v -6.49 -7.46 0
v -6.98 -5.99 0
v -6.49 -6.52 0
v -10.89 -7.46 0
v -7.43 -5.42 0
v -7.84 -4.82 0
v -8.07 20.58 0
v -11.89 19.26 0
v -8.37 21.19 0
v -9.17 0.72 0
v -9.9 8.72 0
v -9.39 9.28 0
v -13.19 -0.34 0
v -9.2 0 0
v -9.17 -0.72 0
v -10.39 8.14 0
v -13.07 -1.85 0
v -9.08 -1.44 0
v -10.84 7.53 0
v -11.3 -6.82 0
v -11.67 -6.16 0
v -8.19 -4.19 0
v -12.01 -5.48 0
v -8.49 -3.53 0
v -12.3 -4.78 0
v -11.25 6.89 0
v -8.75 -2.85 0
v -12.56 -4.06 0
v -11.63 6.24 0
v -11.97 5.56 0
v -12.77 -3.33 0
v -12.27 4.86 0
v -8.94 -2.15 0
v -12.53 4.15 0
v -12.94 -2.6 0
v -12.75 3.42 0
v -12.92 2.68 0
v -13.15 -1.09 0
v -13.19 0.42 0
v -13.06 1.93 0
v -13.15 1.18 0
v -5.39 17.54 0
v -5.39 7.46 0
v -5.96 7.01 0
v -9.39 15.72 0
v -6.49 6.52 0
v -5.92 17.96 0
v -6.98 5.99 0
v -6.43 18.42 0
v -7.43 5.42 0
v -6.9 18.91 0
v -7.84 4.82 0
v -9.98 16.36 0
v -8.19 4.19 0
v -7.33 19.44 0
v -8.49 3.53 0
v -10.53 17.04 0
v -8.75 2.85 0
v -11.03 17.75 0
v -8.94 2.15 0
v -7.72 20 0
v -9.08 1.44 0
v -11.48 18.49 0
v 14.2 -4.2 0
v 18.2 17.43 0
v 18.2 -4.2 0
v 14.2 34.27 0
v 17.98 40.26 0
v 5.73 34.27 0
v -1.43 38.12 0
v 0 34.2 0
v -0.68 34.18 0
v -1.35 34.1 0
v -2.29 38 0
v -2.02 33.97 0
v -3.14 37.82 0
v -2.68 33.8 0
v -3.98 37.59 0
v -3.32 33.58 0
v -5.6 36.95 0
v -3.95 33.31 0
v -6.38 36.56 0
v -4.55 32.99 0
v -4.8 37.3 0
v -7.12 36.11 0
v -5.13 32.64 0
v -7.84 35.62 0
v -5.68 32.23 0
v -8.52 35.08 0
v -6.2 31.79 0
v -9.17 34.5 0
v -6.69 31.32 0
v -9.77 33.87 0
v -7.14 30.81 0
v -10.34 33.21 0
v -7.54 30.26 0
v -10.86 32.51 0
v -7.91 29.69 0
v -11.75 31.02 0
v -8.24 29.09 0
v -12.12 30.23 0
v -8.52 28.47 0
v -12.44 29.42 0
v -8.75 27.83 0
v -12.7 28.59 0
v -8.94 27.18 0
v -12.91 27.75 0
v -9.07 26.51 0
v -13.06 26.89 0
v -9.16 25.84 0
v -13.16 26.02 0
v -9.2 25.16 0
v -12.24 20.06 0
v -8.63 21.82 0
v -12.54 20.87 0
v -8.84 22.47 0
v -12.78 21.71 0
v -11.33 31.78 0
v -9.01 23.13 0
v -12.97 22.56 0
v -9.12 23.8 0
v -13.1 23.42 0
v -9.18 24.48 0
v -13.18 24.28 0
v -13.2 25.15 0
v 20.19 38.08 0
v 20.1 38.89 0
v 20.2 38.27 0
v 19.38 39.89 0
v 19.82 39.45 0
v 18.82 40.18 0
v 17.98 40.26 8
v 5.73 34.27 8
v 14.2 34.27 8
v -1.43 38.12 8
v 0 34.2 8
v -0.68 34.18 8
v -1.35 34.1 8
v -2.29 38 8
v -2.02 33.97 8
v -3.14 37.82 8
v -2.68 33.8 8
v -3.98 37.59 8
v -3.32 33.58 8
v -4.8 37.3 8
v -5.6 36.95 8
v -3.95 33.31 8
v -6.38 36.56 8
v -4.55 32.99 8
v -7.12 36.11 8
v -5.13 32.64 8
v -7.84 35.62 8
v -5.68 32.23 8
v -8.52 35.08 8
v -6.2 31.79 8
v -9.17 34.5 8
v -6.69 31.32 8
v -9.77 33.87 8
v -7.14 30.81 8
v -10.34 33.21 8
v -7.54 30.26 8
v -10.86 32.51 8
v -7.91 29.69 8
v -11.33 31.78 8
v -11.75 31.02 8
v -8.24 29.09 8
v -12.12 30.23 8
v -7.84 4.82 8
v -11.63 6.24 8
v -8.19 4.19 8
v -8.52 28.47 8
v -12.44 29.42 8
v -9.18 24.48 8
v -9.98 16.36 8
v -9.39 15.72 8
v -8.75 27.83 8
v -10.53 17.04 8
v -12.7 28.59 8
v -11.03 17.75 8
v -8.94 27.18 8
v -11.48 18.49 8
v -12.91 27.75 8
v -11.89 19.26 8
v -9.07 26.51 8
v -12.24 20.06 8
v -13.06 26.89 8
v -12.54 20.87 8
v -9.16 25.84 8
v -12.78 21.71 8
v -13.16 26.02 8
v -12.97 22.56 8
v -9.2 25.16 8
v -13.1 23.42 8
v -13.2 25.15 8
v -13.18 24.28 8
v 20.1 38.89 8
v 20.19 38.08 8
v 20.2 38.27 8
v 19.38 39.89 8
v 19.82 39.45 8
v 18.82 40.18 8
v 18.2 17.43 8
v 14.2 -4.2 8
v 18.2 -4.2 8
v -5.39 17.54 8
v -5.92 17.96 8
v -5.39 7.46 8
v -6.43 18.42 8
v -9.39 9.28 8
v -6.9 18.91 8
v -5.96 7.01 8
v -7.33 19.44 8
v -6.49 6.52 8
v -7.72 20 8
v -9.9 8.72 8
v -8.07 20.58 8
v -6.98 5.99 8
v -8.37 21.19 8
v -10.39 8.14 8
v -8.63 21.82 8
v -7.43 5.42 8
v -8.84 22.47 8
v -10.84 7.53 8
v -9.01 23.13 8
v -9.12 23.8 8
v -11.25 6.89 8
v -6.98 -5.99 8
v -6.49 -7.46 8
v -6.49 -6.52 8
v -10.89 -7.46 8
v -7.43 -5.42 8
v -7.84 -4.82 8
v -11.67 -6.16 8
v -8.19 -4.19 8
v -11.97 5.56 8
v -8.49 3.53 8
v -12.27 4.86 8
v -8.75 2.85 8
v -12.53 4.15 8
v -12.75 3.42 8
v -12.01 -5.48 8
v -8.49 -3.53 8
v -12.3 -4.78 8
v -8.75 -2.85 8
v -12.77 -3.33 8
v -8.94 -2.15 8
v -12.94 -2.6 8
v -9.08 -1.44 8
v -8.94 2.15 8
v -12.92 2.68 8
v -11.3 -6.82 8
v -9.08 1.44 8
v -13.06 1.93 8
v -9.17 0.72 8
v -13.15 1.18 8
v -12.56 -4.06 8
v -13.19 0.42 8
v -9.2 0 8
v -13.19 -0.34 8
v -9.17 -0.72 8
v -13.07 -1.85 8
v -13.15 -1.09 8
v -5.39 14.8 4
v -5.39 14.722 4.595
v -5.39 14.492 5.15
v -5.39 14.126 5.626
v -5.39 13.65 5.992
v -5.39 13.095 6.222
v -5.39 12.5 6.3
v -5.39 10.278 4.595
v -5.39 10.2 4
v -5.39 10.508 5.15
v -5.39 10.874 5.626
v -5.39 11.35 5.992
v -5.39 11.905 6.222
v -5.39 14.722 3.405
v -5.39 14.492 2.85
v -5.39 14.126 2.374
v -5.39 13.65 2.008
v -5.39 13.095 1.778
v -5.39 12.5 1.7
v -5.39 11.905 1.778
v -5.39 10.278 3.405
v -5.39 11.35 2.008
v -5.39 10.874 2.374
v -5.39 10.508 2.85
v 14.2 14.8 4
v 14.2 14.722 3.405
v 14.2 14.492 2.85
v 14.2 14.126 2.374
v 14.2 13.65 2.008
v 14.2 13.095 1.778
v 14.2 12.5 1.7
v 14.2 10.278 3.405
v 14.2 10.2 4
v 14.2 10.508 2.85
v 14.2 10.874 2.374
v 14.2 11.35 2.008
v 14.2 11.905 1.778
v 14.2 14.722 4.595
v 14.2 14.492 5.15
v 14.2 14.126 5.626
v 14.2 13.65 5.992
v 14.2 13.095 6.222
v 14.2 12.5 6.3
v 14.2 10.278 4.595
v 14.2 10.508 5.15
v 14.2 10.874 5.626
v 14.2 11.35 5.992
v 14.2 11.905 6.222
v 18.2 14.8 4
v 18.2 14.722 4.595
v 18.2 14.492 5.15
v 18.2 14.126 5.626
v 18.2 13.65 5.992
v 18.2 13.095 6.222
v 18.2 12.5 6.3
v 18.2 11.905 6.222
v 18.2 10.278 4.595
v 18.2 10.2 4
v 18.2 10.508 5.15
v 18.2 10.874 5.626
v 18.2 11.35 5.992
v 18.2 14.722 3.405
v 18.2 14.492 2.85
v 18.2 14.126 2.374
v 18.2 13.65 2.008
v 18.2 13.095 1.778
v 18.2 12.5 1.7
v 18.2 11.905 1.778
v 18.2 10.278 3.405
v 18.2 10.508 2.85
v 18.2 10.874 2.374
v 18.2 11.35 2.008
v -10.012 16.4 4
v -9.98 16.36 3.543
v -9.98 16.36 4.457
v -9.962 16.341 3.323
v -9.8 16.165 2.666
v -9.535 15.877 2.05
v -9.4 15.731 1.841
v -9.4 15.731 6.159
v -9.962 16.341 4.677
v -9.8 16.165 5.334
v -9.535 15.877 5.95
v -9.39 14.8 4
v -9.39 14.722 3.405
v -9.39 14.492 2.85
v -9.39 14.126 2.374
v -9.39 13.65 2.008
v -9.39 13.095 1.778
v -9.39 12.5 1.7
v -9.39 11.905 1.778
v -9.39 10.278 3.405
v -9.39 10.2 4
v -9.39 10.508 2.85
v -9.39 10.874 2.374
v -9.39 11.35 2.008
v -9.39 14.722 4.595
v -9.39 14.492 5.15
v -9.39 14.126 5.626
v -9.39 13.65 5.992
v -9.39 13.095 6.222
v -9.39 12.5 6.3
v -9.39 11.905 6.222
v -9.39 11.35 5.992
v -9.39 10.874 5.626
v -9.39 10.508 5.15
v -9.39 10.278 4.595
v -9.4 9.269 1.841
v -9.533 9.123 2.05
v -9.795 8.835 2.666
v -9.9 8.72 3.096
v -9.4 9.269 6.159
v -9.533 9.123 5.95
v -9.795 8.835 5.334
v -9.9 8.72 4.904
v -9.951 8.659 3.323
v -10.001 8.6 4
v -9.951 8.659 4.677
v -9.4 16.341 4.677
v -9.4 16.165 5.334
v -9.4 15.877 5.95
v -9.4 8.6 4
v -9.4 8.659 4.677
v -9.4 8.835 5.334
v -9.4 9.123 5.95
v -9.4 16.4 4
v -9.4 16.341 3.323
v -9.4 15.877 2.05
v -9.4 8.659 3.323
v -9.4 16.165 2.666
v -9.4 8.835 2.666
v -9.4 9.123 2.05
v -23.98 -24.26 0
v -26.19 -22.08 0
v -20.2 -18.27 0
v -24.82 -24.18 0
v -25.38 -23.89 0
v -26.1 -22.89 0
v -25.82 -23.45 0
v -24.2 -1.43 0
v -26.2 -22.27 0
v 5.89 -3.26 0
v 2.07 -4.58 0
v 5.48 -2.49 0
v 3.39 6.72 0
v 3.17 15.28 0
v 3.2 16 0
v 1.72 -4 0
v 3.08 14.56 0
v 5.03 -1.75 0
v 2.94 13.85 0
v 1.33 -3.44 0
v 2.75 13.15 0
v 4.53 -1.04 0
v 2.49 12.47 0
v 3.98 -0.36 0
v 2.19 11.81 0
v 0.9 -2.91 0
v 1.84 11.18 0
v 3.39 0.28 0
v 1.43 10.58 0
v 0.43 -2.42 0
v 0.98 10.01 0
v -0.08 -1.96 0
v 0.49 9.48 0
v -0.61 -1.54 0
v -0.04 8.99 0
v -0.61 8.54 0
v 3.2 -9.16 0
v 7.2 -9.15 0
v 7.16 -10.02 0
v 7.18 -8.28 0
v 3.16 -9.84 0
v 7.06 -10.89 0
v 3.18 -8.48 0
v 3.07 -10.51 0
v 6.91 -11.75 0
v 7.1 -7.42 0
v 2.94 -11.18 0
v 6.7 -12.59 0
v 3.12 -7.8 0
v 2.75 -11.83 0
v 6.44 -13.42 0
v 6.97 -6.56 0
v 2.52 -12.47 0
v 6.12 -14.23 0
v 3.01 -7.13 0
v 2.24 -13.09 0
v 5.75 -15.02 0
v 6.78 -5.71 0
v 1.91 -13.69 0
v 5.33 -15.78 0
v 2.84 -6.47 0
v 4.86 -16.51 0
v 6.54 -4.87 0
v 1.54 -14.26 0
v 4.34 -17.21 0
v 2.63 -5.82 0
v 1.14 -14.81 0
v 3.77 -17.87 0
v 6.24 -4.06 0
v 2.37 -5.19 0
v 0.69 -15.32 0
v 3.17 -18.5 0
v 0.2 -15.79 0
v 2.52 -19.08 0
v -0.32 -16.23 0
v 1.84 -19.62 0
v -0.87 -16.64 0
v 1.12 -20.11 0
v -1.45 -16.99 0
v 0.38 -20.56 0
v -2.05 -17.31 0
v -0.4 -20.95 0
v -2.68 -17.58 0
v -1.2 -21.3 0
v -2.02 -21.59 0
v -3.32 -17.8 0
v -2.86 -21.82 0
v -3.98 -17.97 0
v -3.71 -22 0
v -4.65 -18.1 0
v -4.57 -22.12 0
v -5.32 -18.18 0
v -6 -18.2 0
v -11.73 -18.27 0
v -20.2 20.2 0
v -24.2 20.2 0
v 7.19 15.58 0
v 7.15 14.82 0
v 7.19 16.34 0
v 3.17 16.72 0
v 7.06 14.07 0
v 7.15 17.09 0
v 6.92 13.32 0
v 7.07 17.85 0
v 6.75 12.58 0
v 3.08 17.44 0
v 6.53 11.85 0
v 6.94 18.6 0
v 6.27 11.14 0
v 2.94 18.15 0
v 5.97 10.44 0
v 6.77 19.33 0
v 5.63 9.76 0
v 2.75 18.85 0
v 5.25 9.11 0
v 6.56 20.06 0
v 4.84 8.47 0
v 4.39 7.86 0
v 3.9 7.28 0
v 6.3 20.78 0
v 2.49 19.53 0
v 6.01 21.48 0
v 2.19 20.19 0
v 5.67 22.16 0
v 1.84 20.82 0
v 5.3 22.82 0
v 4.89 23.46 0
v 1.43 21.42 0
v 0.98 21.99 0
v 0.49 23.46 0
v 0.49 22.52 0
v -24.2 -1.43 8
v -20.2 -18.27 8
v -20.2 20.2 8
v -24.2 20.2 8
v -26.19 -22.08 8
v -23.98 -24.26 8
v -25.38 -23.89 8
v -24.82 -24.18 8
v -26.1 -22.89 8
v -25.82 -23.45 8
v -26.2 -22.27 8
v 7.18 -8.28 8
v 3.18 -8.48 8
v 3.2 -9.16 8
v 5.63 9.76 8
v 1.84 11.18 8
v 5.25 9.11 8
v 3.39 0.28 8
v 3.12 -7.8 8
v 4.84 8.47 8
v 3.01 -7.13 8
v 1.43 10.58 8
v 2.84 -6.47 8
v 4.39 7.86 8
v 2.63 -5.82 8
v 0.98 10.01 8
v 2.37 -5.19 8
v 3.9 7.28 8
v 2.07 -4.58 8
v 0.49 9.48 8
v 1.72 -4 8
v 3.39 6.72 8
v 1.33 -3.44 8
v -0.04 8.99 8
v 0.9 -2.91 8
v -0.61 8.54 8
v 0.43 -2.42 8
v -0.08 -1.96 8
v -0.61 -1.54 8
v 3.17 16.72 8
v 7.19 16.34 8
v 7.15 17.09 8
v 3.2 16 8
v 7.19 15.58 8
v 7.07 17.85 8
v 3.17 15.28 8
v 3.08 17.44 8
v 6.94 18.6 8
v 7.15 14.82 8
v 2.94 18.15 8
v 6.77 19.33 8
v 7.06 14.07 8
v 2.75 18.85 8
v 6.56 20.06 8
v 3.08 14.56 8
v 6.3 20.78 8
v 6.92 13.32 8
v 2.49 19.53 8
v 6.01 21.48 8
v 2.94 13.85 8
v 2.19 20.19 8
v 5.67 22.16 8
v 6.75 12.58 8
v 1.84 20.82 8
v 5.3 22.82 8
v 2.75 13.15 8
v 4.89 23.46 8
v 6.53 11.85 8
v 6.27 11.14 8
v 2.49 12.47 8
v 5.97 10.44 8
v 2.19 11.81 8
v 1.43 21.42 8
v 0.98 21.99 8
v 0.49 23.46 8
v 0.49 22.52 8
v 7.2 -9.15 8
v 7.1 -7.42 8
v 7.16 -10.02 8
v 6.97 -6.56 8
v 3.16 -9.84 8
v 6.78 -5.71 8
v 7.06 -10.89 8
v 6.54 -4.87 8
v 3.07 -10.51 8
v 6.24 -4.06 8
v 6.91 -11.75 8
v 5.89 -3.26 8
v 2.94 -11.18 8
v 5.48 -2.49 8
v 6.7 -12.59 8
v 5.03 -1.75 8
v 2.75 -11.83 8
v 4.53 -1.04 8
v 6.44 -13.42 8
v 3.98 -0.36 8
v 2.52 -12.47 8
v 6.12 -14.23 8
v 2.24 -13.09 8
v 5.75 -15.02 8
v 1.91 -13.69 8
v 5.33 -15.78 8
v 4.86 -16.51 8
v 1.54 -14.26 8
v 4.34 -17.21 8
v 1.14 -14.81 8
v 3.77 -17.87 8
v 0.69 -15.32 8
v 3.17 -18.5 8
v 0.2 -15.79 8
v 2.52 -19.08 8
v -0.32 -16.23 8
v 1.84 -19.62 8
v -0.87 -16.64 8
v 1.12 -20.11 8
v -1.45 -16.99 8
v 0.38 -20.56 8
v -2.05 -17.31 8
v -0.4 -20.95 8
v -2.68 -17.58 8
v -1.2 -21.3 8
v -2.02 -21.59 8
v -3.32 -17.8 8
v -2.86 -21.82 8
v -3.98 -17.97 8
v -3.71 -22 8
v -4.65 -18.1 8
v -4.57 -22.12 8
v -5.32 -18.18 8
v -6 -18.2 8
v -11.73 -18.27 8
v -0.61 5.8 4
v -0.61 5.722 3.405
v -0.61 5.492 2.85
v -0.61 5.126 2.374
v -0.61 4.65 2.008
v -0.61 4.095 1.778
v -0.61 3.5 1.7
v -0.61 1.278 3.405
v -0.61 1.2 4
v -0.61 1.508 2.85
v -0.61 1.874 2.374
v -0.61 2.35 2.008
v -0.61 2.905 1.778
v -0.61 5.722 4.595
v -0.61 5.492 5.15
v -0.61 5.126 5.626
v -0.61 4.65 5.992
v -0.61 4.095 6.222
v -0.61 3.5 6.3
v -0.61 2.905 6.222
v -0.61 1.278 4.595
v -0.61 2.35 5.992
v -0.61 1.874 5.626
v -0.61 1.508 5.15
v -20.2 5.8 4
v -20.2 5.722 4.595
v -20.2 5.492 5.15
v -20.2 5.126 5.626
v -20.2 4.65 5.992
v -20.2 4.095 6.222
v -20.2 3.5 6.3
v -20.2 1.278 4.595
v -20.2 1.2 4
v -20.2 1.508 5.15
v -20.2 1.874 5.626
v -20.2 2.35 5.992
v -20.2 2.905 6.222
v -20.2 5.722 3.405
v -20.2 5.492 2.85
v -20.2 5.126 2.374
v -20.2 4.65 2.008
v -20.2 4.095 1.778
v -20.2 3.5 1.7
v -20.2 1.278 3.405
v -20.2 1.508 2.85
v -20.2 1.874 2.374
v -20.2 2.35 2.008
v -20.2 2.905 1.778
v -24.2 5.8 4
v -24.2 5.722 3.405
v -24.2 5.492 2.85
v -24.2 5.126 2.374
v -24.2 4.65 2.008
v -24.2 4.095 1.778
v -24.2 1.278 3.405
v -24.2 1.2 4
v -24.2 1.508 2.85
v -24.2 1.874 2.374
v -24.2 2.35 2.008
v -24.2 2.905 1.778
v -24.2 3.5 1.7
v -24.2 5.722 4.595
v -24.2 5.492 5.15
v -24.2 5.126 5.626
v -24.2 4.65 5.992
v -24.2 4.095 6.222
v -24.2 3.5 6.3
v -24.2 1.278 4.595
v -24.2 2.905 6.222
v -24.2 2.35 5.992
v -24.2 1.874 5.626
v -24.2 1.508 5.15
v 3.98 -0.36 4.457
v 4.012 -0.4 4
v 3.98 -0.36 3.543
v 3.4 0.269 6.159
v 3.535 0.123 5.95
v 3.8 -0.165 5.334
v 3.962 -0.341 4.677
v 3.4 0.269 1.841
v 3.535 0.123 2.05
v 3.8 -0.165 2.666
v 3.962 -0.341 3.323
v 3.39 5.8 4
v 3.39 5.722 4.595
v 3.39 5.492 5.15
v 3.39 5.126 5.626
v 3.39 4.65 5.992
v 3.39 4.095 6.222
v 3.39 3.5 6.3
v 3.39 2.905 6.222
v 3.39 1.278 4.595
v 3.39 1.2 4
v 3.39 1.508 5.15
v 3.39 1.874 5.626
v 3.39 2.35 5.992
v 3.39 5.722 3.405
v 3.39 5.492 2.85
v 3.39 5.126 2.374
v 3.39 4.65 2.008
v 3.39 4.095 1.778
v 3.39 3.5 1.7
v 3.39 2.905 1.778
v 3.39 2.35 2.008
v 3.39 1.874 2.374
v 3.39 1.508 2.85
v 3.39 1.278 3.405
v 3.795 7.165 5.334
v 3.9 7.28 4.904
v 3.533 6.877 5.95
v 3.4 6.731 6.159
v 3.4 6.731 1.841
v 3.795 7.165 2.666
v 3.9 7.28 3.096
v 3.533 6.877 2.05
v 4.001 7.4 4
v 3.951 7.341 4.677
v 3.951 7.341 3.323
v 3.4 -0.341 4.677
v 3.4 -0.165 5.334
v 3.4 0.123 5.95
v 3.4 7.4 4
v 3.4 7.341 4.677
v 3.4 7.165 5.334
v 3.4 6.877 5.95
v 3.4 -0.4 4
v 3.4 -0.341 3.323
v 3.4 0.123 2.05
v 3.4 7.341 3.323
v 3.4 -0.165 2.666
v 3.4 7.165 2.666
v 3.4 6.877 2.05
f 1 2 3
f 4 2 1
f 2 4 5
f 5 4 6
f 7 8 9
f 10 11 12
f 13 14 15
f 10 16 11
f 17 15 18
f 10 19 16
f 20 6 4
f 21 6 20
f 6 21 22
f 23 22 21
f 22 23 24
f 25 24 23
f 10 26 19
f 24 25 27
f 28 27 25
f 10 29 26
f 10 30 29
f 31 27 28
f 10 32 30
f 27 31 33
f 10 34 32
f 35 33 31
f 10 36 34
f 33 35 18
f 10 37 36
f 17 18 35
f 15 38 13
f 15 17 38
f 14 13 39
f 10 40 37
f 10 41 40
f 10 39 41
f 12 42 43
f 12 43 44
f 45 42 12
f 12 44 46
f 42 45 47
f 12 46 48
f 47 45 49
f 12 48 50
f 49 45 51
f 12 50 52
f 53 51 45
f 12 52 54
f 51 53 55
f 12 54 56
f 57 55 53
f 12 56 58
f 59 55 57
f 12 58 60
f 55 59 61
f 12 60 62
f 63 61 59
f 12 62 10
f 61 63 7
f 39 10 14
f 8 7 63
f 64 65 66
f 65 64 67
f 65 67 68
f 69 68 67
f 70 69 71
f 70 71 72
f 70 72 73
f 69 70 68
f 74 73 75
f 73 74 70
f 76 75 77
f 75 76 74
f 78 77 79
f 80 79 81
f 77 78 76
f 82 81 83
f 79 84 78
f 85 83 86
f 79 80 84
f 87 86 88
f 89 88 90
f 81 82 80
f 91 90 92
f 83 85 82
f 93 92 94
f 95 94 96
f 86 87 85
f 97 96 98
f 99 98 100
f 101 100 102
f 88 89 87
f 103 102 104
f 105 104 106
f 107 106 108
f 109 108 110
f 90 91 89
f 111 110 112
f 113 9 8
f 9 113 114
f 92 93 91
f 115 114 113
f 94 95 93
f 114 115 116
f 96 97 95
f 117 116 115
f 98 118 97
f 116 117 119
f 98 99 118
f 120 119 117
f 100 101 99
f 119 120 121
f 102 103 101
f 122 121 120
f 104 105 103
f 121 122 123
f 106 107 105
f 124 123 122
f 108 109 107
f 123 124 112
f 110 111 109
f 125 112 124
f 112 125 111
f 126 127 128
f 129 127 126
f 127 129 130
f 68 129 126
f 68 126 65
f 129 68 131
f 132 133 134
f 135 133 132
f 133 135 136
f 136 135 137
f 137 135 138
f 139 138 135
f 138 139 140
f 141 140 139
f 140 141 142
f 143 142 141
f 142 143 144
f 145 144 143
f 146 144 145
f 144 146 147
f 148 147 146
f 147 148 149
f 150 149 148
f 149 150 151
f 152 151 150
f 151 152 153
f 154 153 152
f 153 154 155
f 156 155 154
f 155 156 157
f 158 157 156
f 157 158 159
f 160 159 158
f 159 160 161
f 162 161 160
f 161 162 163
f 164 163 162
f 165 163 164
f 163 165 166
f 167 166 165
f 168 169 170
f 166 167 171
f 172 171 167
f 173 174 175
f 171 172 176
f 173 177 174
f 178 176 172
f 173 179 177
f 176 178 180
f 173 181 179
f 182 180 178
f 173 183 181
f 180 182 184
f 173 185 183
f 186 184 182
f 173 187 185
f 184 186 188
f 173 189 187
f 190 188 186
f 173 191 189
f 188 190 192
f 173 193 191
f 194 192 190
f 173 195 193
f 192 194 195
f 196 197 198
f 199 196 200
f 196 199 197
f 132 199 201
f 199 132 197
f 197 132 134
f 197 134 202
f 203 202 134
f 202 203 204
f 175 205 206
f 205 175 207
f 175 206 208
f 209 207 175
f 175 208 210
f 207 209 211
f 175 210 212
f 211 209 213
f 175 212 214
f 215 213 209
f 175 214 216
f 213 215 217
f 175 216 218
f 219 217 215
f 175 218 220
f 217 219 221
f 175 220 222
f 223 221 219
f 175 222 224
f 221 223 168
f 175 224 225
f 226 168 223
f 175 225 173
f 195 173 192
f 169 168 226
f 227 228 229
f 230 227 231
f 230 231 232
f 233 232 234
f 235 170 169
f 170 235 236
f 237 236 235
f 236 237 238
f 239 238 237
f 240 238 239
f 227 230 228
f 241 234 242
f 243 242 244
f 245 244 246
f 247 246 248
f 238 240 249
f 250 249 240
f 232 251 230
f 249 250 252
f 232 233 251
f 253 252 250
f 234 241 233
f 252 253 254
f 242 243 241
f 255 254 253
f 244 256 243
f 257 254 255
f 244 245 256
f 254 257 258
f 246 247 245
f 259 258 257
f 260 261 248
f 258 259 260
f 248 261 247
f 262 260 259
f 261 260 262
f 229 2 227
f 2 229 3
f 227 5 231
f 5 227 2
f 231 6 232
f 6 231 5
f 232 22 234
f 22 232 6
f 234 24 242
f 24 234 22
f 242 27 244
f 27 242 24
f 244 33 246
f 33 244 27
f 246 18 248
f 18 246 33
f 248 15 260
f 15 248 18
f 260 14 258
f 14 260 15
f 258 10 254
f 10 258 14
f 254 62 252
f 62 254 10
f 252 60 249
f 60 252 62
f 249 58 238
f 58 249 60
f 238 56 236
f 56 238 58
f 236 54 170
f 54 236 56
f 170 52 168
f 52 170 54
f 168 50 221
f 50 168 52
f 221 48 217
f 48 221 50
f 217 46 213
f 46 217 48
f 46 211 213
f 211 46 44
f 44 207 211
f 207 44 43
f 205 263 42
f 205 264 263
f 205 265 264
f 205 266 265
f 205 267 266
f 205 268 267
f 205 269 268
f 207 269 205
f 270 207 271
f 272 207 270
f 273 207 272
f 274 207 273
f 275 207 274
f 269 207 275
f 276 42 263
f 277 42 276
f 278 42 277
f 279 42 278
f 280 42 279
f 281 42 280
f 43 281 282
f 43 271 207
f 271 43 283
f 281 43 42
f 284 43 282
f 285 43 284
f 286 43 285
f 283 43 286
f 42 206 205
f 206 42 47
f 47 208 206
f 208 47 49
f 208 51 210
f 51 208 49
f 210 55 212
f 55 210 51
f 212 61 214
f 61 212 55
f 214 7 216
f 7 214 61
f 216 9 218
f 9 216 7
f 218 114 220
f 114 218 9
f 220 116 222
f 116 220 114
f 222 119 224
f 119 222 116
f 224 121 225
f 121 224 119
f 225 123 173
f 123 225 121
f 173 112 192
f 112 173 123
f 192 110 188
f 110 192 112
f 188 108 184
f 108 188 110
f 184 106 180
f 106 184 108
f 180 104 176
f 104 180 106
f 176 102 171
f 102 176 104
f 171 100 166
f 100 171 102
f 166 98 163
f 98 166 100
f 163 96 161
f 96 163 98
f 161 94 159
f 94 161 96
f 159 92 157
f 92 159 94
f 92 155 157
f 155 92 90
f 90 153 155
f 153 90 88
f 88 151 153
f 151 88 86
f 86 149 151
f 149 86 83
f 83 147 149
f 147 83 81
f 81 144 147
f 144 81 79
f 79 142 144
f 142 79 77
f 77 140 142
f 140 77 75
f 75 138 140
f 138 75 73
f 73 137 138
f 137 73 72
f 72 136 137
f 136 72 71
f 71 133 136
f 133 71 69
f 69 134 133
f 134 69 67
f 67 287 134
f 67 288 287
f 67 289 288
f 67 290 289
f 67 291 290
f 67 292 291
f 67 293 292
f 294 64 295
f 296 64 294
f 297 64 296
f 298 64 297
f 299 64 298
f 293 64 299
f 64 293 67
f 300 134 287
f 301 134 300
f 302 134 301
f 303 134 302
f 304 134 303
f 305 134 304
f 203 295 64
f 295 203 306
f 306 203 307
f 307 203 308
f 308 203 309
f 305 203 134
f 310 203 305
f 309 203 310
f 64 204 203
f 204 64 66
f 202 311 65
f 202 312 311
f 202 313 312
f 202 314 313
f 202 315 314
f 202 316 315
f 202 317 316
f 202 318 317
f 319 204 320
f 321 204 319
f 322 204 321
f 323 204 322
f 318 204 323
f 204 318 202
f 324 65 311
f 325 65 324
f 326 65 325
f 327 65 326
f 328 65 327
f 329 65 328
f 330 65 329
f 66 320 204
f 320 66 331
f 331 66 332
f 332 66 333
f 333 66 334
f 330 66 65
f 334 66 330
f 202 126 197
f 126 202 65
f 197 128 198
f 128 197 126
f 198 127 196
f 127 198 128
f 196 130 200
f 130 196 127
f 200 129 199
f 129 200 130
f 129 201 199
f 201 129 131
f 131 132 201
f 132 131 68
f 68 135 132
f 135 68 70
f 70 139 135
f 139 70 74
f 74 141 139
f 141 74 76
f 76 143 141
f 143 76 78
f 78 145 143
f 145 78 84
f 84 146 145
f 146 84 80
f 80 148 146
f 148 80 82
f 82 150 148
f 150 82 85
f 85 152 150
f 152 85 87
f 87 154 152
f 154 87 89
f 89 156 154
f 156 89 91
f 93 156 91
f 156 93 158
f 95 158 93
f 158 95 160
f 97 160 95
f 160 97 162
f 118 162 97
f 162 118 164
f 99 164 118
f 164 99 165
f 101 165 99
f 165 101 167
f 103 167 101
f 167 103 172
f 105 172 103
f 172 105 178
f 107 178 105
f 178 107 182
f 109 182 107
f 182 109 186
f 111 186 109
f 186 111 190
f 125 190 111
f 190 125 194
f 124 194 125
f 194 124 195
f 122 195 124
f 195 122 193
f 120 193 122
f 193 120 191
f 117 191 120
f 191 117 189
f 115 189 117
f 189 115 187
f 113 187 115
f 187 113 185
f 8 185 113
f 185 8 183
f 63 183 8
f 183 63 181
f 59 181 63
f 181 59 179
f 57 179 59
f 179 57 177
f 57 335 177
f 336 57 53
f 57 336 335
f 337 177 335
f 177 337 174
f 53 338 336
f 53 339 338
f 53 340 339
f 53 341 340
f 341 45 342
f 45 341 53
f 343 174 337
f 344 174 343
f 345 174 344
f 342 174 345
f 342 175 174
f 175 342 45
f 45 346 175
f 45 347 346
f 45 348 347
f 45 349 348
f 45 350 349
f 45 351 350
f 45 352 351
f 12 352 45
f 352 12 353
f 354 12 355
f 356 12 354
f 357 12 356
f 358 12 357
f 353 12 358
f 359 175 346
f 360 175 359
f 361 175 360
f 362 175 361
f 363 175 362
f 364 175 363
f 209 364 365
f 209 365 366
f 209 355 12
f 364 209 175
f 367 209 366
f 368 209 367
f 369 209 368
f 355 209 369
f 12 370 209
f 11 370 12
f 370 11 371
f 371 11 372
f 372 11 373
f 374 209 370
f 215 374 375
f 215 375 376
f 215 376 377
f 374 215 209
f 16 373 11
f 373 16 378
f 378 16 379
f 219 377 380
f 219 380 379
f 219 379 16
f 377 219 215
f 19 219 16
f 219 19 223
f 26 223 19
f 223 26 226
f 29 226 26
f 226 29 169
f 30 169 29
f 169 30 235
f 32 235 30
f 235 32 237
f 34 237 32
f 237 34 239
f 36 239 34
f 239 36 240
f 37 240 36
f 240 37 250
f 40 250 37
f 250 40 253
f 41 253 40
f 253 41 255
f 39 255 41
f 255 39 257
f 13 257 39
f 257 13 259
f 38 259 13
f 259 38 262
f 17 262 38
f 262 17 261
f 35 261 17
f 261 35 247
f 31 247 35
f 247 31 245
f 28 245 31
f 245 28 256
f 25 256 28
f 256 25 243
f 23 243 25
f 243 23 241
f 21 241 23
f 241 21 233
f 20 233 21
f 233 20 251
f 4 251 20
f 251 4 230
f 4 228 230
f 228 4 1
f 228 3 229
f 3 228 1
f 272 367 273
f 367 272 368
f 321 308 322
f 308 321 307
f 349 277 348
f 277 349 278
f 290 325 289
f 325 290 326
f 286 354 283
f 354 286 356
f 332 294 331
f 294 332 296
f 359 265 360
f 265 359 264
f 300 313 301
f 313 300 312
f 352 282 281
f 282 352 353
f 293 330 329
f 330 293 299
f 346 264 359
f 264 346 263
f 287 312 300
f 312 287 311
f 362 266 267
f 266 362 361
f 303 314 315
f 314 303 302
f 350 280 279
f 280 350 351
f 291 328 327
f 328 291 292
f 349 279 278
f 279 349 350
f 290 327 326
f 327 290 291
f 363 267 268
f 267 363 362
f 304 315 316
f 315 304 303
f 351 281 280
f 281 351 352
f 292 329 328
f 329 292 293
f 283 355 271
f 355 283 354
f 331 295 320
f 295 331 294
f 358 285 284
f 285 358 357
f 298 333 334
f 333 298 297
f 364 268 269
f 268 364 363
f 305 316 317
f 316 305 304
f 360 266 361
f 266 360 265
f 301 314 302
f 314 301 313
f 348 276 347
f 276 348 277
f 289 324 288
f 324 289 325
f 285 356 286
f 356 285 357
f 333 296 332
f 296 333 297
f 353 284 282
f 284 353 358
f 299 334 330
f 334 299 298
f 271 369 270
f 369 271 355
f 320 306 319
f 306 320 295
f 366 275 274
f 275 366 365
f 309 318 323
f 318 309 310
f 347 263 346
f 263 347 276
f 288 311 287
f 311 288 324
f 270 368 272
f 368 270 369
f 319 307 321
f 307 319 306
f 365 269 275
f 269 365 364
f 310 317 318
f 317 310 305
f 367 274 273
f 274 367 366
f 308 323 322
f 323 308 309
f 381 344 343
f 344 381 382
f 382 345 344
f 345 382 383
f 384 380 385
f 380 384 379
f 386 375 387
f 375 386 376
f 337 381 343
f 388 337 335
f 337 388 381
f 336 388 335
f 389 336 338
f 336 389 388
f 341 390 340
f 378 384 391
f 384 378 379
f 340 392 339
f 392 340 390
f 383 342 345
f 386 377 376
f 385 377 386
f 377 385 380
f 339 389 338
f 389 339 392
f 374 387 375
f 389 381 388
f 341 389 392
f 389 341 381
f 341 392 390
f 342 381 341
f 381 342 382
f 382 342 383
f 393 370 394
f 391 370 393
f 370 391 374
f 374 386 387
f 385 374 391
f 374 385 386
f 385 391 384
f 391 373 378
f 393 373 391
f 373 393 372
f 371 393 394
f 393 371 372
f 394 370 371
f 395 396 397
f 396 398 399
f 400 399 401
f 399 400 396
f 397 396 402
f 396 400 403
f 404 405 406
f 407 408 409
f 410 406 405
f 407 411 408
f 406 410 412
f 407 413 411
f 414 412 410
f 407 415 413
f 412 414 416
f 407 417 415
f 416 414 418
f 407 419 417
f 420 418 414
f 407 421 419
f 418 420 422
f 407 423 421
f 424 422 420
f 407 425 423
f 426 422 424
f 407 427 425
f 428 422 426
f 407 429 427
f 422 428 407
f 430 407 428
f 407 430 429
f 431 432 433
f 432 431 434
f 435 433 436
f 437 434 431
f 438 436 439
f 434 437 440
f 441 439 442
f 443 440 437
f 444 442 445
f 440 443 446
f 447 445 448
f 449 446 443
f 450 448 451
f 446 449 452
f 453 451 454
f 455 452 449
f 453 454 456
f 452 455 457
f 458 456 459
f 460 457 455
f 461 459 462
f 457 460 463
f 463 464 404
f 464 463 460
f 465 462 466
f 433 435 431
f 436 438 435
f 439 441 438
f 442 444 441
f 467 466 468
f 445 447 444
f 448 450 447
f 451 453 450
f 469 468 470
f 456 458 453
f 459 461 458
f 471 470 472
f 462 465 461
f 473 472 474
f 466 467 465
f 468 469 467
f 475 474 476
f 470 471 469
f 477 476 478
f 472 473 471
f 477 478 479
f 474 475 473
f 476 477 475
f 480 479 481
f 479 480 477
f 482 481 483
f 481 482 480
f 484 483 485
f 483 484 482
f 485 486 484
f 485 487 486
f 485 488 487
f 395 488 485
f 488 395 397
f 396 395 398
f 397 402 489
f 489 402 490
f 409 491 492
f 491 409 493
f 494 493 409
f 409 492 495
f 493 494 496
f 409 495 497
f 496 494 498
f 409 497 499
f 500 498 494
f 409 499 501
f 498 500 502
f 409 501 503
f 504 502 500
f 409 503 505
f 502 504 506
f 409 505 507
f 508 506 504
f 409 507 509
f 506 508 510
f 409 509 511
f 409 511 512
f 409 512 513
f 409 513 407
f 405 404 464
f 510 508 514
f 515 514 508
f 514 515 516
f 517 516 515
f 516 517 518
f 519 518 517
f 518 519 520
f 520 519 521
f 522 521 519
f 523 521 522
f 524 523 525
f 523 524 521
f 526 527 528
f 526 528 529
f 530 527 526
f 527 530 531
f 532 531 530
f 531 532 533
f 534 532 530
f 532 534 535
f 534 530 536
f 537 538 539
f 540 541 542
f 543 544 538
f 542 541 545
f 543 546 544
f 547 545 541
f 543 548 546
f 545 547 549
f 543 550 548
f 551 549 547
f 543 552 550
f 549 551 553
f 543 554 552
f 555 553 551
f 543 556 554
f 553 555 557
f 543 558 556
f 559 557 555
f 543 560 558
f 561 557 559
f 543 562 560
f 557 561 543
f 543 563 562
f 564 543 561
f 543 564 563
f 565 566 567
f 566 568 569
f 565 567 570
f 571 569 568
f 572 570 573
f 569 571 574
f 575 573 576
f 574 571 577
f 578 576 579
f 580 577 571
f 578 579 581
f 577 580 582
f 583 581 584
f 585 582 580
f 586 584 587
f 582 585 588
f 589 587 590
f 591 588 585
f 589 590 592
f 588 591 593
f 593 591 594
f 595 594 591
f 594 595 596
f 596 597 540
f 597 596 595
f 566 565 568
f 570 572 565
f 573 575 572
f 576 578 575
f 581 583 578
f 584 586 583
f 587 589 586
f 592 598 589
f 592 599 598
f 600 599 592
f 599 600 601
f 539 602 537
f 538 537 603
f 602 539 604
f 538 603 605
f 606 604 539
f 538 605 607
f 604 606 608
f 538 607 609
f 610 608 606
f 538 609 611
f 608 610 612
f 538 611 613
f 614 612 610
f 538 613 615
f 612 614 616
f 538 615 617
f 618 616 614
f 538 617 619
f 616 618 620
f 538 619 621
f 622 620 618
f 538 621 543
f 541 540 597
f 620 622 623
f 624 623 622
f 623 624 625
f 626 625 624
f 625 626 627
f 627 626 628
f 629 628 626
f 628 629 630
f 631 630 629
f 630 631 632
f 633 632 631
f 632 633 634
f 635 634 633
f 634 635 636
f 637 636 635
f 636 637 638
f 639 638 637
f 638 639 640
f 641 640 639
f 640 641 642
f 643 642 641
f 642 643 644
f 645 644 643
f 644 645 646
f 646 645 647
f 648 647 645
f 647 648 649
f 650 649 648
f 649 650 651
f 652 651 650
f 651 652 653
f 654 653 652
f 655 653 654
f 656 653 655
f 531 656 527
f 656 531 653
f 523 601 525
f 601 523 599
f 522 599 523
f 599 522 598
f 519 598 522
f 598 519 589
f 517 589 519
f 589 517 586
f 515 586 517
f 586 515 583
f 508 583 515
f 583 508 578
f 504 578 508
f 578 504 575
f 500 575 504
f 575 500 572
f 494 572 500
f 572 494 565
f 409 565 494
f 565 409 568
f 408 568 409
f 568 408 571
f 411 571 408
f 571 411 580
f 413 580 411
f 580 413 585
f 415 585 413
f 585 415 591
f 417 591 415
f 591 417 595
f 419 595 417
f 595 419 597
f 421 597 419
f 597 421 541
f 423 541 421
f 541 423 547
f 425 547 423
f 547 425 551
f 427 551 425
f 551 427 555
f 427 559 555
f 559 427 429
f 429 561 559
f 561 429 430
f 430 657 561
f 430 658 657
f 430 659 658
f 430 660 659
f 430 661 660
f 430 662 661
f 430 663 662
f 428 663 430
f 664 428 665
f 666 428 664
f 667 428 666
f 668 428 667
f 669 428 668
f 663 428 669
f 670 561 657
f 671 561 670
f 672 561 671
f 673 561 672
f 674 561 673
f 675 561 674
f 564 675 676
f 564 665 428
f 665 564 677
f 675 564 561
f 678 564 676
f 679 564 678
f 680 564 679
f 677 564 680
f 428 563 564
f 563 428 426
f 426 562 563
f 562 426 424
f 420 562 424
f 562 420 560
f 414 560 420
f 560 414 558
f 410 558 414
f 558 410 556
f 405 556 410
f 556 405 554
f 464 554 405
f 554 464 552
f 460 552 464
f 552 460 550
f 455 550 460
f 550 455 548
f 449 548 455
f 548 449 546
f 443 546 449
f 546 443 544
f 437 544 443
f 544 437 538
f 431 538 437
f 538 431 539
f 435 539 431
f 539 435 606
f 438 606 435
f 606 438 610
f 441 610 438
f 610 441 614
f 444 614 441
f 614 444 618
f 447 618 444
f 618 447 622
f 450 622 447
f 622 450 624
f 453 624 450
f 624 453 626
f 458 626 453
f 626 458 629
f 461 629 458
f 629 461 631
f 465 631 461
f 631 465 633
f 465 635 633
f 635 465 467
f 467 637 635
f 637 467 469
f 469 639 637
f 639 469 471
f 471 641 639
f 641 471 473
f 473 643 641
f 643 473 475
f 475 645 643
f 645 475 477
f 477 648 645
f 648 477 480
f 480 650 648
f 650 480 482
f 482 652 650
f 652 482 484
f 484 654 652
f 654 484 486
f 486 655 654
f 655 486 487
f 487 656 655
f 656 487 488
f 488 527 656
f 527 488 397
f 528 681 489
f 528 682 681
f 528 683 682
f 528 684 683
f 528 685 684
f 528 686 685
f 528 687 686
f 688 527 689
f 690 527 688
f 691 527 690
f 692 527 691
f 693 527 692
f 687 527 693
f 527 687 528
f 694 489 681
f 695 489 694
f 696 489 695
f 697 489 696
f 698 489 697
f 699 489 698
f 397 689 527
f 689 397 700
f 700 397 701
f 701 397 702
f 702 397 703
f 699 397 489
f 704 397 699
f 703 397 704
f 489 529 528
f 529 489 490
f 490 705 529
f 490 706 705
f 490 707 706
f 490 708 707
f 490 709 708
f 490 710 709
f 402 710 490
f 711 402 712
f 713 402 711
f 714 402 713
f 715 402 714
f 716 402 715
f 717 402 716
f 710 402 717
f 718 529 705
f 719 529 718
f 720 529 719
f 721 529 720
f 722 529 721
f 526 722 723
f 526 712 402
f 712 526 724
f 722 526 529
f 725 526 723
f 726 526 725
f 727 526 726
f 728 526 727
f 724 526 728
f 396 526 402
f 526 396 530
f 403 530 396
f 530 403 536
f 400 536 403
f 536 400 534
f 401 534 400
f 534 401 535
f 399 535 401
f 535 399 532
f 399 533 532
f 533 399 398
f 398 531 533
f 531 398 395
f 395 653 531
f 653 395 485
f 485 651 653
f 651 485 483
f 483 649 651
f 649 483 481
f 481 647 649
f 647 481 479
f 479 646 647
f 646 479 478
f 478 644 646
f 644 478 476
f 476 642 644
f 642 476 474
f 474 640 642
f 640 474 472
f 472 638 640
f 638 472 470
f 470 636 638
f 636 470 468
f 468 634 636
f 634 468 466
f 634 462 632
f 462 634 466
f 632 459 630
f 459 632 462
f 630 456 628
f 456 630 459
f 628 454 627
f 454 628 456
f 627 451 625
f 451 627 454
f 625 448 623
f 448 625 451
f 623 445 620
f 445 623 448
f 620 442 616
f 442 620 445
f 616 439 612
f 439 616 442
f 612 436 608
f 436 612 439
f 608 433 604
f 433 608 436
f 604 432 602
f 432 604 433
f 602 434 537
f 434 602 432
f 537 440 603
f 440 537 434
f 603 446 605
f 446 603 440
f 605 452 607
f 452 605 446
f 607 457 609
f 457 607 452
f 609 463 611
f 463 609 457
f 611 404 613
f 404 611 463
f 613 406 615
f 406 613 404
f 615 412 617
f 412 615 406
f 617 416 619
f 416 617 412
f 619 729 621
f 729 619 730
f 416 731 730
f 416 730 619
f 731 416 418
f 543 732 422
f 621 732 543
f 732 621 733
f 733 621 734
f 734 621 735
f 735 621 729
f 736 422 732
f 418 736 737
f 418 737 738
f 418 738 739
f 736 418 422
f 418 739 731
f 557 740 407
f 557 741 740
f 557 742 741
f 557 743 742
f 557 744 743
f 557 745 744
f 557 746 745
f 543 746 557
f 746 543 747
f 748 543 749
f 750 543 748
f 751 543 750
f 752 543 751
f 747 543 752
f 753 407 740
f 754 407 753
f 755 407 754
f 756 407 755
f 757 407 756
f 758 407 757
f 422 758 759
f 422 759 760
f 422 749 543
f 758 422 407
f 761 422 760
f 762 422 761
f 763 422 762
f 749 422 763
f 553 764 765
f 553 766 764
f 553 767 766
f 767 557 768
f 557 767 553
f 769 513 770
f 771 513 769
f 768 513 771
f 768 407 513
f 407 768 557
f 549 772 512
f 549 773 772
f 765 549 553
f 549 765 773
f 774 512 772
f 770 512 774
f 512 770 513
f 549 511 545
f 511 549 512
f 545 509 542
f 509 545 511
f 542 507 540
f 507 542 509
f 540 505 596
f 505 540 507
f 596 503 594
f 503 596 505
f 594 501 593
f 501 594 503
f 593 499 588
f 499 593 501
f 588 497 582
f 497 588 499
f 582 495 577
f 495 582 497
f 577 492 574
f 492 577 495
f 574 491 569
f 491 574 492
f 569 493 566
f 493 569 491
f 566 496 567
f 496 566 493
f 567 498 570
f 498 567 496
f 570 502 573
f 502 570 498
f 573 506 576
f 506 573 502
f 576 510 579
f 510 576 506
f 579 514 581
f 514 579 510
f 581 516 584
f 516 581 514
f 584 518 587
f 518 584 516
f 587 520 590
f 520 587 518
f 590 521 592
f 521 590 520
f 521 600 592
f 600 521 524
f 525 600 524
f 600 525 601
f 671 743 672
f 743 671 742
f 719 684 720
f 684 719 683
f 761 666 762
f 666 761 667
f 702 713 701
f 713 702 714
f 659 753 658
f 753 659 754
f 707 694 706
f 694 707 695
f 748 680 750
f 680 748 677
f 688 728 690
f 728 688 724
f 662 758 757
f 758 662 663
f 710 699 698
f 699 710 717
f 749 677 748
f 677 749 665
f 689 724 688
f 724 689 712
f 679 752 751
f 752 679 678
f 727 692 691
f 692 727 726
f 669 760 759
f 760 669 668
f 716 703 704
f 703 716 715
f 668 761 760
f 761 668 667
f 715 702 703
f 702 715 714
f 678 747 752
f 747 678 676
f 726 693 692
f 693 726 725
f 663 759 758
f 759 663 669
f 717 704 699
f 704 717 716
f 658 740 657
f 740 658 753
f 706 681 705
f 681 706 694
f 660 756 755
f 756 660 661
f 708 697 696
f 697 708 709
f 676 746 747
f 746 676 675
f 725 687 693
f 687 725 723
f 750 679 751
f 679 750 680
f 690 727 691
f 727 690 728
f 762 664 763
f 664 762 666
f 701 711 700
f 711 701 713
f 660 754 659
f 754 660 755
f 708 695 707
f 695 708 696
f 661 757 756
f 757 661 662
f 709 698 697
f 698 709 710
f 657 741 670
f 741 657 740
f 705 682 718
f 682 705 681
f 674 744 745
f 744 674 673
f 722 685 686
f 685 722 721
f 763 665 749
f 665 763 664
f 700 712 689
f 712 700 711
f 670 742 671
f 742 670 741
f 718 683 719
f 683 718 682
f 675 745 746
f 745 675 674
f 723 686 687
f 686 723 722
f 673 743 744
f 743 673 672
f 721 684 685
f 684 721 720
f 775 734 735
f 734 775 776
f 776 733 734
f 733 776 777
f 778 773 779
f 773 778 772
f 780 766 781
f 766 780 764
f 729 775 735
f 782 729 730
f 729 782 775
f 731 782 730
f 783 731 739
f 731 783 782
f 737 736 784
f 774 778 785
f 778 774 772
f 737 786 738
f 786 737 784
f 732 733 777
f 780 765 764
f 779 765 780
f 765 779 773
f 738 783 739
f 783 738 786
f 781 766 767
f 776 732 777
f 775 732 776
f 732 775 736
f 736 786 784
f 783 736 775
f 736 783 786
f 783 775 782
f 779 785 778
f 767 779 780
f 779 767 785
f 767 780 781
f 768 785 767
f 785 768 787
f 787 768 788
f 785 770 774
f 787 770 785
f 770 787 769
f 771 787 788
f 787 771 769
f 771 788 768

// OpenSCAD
//Brackets to hold Horizontal 1/2" EMT to Vertex
//11/25/2016    By: David Bunch
//
Ht = 8;                     //Height of extrusion of Brackets
Bracket_Type = 0;           //0 = Simple Bracket to connect EMT to Vertex
                            //1 = Simple Extended Bracket
                            //2 = Bracket to connect EMT to Vertex & DoveTail Frame
                            //3 = Type 0 & 2
                            //4 = Type 0, 1 & 2
Qty = 2;                    //1 or 2 brackets
HoleID = 4.6;               //Diameter of hole, sized for M4 or #8 screw
ScrewHdDia = 7.8;           //Diameter of Screw Head
ScrewHd_Res = 36;           //Resolution of screw head
$fn=24;                     //Resolution of drill holes
//Bracket that holds 1/2" Horizontal EMT to Vertex with one screw & Locknut
module Bracket()
{
    translate([9.2+9,12.5,0])   //Move Origin to Center bottom 1/2" Horizontal EMT
                                //This makes it easier to add to an Assembly drawint
    difference()
    {
        linear_extrude(height = Ht, center = false, convexity = 10)polygon(points = 
        [[-27.59,-3.22],[-27.59,3.22],[-28.18,3.86],[-28.73,4.54],[-29.23,5.25],
        [-29.68,5.99],[-30.09,6.76],[-30.44,7.56],[-30.74,8.37],[-30.98,9.21],
        [-31.17,10.06],[-31.3,10.92],[-31.38,11.78],[-31.4,12.65],[-31.36,13.52],
        [-31.26,14.39],[-31.11,15.25],[-30.9,16.09],[-30.64,16.92],[-30.32,17.73],
        [-29.95,18.52],[-29.53,19.28],[-29.06,20.01],[-28.54,20.71],[-27.97,21.37],
        [-27.37,22],[-26.72,22.58],[-26.04,23.12],[-25.32,23.61],[-24.58,24.06],
        [-23.8,24.45],[-23,24.8],[-22.18,25.09],[-21.34,25.32],[-20.49,25.5],
        [-19.63,25.62],[-0.22,27.76],[0.62,27.68],[1.18,27.39],[1.62,26.95],
        [1.9,26.39],[2,25.77],[1.99,25.58],[0,4.93],[0,-16.7],
        [-4,-16.7],[-4,21.77],[-12.47,21.77],[-18.2,21.7],[-18.88,21.68],
        [-19.55,21.6],[-20.22,21.47],[-20.88,21.3],[-21.52,21.08],[-22.15,20.81],
        [-22.75,20.49],[-23.33,20.14],[-23.88,19.73],[-24.4,19.29],[-24.89,18.82],
        [-25.34,18.31],[-25.74,17.76],[-26.11,17.19],[-26.44,16.59],[-26.72,15.97],
        [-26.95,15.33],[-27.14,14.68],[-27.27,14.01],[-27.36,13.34],[-27.4,12.66],
        [-27.38,11.98],[-27.32,11.3],[-27.21,10.63],[-27.04,9.97],[-26.83,9.32],
        [-26.57,8.69],[-26.27,8.08],[-25.92,7.5],[-25.53,6.94],[-25.1,6.41],
        [-24.63,5.92],[-24.12,5.46],[-23.59,5.04],[-23.59,-5.04],[-24.16,-5.49],
        [-24.69,-5.98],[-25.18,-6.51],[-25.63,-7.08],[-26.04,-7.68],[-26.39,-8.31],
        [-26.69,-8.97],[-26.95,-9.65],[-27.14,-10.35],[-27.28,-11.06],[-27.37,-11.78],
        [-27.4,-12.5],[-27.37,-13.22],[-27.28,-13.94],[-27.14,-14.65],[-26.95,-15.35],
        [-26.69,-16.03],[-26.39,-16.69],[-26.04,-17.32],[-25.63,-17.92],[-25.18,-18.49],
        [-24.69,-19.02],[-24.69,-19.96],[-29.09,-19.96],[-29.5,-19.32],[-29.87,-18.66],
        [-30.21,-17.98],[-30.5,-17.28],[-30.76,-16.56],[-30.97,-15.83],[-31.14,-15.1],
        [-31.27,-14.35],[-31.35,-13.59],[-31.39,-12.84],[-31.39,-12.08],[-31.35,-11.32],
        [-31.26,-10.57],[-31.12,-9.82],[-30.95,-9.08],[-30.73,-8.35],[-30.47,-7.64],
        [-30.17,-6.94],[-29.83,-6.26],[-29.45,-5.61],[-29.04,-4.97],[-28.59,-4.36],
        [-28.1,-3.78]]);
        translate([0,0,Ht / 2])
        rotate([0,90,0])
        cylinder(d=HoleID,h=100,center=true);
        translate([-27.6,0,Ht / 2])
        rotate([0,-90,0])
        cylinder(d=ScrewHdDia,h=10,$fn=ScrewHd_Res);
    }
}
//Bracket that holds 1/2" Horizontal EMT to Vertex and Dovetail Frame with one screw & Locknut
module VertexFrameBracket()
{
    translate([9.2+9,12.5,0])   //Move Origin to Center bottom 1/2" Horizontal EMT
    difference()
    {
        linear_extrude(height = Ht, center = false, convexity = 10)polygon(points = 
        [[-27.59,-3.22],[-27.59,3.22],[-28.18,3.86],[-28.73,4.54],[-29.23,5.25],
        [-29.68,5.99],[-30.09,6.76],[-30.44,7.56],[-30.74,8.37],[-30.98,9.21],
        [-31.17,10.06],[-31.3,10.92],[-31.38,11.78],[-31.4,12.65],[-31.36,13.52],
        [-31.26,14.39],[-31.11,15.25],[-30.9,16.09],[-30.64,16.92],[-30.32,17.73],
        [-29.95,18.52],[-29.53,19.28],[-29.06,20.01],[-28.54,20.71],[-27.97,21.37],
        [-27.37,22],[-26.72,22.58],[-26.04,23.12],[-25.32,23.61],[-24.58,24.06],
        [-23.8,24.45],[-23,24.8],[-22.18,25.09],[-21.34,25.32],[-20.49,25.5],
        [-19.63,25.62],[-0.22,27.76],[0.62,27.68],[1.18,27.39],[1.62,26.95],
        [1.9,26.39],[2,25.77],[1.99,25.58],[4,10.26],[4,-16.7],
        [0,-16.7],[0,6.26],[-4,10.26],[-4,21.77],[-12.47,21.77],
        [-18.2,21.7],[-18.88,21.68],[-19.55,21.6],[-20.22,21.47],[-20.88,21.3],
        [-21.52,21.08],[-22.15,20.81],[-22.75,20.49],[-23.33,20.14],[-23.88,19.73],
        [-24.4,19.29],[-24.89,18.82],[-25.34,18.31],[-25.74,17.76],[-26.11,17.19],
        [-26.44,16.59],[-26.72,15.97],[-26.95,15.33],[-27.14,14.68],[-27.27,14.01],
        [-27.36,13.34],[-27.4,12.66],[-27.38,11.98],[-27.32,11.3],[-27.21,10.63],
        [-27.04,9.97],[-26.83,9.32],[-26.57,8.69],[-26.27,8.08],[-25.92,7.5],
        [-25.53,6.94],[-25.1,6.41],[-24.63,5.92],[-24.12,5.46],[-23.59,5.04],
        [-23.59,-5.04],[-24.16,-5.49],[-24.69,-5.98],[-25.18,-6.51],[-25.63,-7.08],
        [-26.04,-7.68],[-26.39,-8.31],[-26.69,-8.97],[-26.95,-9.65],[-27.14,-10.35],
        [-27.28,-11.06],[-27.37,-11.78],[-27.4,-12.5],[-27.37,-13.22],[-27.28,-13.94],
        [-27.14,-14.65],[-26.95,-15.35],[-26.69,-16.03],[-26.39,-16.69],[-26.04,-17.32],
        [-25.63,-17.92],[-25.18,-18.49],[-24.69,-19.02],[-24.69,-19.96],[-29.09,-19.96],
        [-29.5,-19.32],[-29.87,-18.66],[-30.21,-17.98],[-30.5,-17.28],[-30.76,-16.56],
        [-30.97,-15.83],[-31.14,-15.1],[-31.27,-14.35],[-31.35,-13.59],[-31.39,-12.84],
        [-31.39,-12.08],[-31.35,-11.32],[-31.26,-10.57],[-31.12,-9.82],[-30.95,-9.08],
        [-30.73,-8.35],[-30.47,-7.64],[-30.17,-6.94],[-29.83,-6.26],[-29.45,-5.61],
        [-29.04,-4.97],[-28.59,-4.36],[-28.1,-3.78]]);
        translate([0,0,Ht / 2])
        rotate([0,90,0])
        cylinder(d=HoleID,h=100,center=true);
        translate([-27.6,0,Ht / 2])
        rotate([0,-90,0])
        cylinder(d=ScrewHdDia,h=10,$fn=ScrewHd_Res);
    }
}
//Brackets that holds 1/2" Horizontal EMT to Vertex with two screws & Locknuts
//Used in conjunction with BracketCube()
module ExtBracket()
{
    difference()
    {
        linear_extrude(height = Ht, center = false, convexity = 10)polygon(points = 
        [[-27.59,-3.22],[-27.59,3.22],[-28.18,3.86],[-28.73,4.54],[-29.23,5.25],
        [-29.68,5.99],[-30.09,6.76],[-30.44,7.56],[-30.74,8.37],[-30.98,9.21],
        [-31.17,10.06],[-31.3,10.92],[-31.38,11.78],[-31.4,12.65],[-31.36,13.52],
        [-31.26,14.39],[-31.11,15.25],[-30.9,16.09],[-30.64,16.92],[-30.32,17.73],
        [-29.95,18.52],[-29.53,19.28],[-29.06,20.01],[-28.54,20.71],[-27.97,21.37],
        [-27.37,22],[-26.72,22.58],[-26.04,23.12],[-25.32,23.61],[-24.58,24.06],
        [-23.8,24.45],[-23,24.8],[-22.18,25.09],[-21.34,25.32],[-20.49,25.5],
        [-19.63,25.62],[-18.2,25.76],[-10,25.77],[-8,27.77],[-8,42.27],
        [-4,42.27],[-4,21.77],[-12.47,21.77],[-18.2,21.7],[-18.88,21.68],
        [-19.55,21.6],[-20.22,21.47],[-20.88,21.3],[-21.52,21.08],[-22.15,20.81],
        [-22.75,20.49],[-23.33,20.14],[-23.88,19.73],[-24.4,19.29],[-24.89,18.82],
        [-25.34,18.31],[-25.74,17.76],[-26.11,17.19],[-26.44,16.59],[-26.72,15.97],
        [-26.95,15.33],[-27.14,14.68],[-27.27,14.01],[-27.36,13.34],[-27.4,12.66],
        [-27.38,11.98],[-27.32,11.3],[-27.21,10.63],[-27.04,9.97],[-26.83,9.32],
        [-26.57,8.69],[-26.27,8.08],[-25.92,7.5],[-25.53,6.94],[-25.1,6.41],
        [-24.63,5.92],[-24.12,5.46],[-23.59,5.04],[-23.59,-5.04],[-24.16,-5.49],
        [-24.69,-5.98],[-25.18,-6.51],[-25.63,-7.08],[-26.04,-7.68],[-26.39,-8.31],
        [-26.69,-8.97],[-26.95,-9.65],[-27.14,-10.35],[-27.28,-11.06],[-27.37,-11.78],
        [-27.4,-12.5],[-27.37,-13.22],[-27.28,-13.94],[-27.14,-14.65],[-26.95,-15.35],
        [-26.69,-16.03],[-26.39,-16.69],[-26.04,-17.32],[-25.63,-17.92],[-25.18,-18.49],
        [-24.69,-19.02],[-24.69,-19.96],[-29.09,-19.96],[-29.5,-19.32],[-29.87,-18.66],
        [-30.21,-17.98],[-30.5,-17.28],[-30.76,-16.56],[-30.97,-15.83],[-31.14,-15.1],
        [-31.27,-14.35],[-31.35,-13.59],[-31.39,-12.84],[-31.39,-12.08],[-31.35,-11.32],
        [-31.26,-10.57],[-31.12,-9.82],[-30.95,-9.08],[-30.73,-8.35],[-30.47,-7.64],
        [-30.17,-6.94],[-29.83,-6.26],[-29.45,-5.61],[-29.04,-4.97],[-28.59,-4.36],
        [-28.1,-3.78]]);
        translate([0,0,Ht / 2])
        rotate([0,90,0])
        cylinder(d=HoleID,h=100,center=true);

        translate([-27.6,0,Ht / 2])
        rotate([0,-90,0])
        cylinder(d=ScrewHdDia,h=10,$fn=ScrewHd_Res);

        translate([0,35,Ht / 2])
        rotate([0,90,0])
        cylinder(d=HoleID,h=100,center=true);
    }
}
module Bump()
{
    translate([0,0,-3])
    cylinder(d1=0,d2=6,h=3.01,$fn=6);
    cylinder(d=6,h=20.8,$fn=6);
    translate([0,0,20.8])
    cylinder(d1=6,d2=0,h=3,$fn=6);
}
//Used in conjunction with ExtBracket()
module BracketCube()
{
    translate([-8,-25,4])
    rotate([0,0,90])
    rotate([-90,0,0])
    union()
    {
        difference()
        {
            translate([-7.25,0,0])
            cube([49.5,4,Ht]);
            translate([0,-1,Ht / 2])
            rotate([-90,0,0])
            cylinder(d=HoleID,h=30,$fn=24);
            translate([35,-1,Ht / 2])
            rotate([-90,0,0])
            cylinder(d=HoleID,h=30,$fn=24);
        }
        translate([7.1,0,Ht / 2])
        rotate([0,90,0])
        Bump();
    }
}
if (Bracket_Type == 0)
{
   for (n = [0,Qty - 1])
   {
        translate([0,n * 16,0])
        rotate([0,0,n * 180])
        translate([n * 6,0,0])
        Bracket();
   }
} else if (Bracket_Type == 1)
{
   for (n = [0,Qty - 1])
   { 
        rotate([0,0,n * 180])
        translate([n * 8,0,0])
        {
            BracketCube();
            translate([-9,0,0])
            rotate([0,0,180])
            ExtBracket();
        }
    }
} else if (Bracket_Type == 2) 
{
   for (n = [0,Qty - 1])
   {
        translate([n * 14,n * 12,0])
        rotate([0,0,n * 180])
        translate([n * 16,0,0])
        VertexFrameBracket();
   }
} else if (Bracket_Type == 3)
{
    Bracket();
    translate([-4,16,0])
    rotate([0,0,180])
    VertexFrameBracket();
} else if (Bracket_Type == 4)
{
    translate([-17,-6,0])
    Bracket();
    BracketCube();
    translate([-9,0,0])
    rotate([0,0,180])
    ExtBracket();
    translate([18,-6,0])
    VertexFrameBracket();
}
